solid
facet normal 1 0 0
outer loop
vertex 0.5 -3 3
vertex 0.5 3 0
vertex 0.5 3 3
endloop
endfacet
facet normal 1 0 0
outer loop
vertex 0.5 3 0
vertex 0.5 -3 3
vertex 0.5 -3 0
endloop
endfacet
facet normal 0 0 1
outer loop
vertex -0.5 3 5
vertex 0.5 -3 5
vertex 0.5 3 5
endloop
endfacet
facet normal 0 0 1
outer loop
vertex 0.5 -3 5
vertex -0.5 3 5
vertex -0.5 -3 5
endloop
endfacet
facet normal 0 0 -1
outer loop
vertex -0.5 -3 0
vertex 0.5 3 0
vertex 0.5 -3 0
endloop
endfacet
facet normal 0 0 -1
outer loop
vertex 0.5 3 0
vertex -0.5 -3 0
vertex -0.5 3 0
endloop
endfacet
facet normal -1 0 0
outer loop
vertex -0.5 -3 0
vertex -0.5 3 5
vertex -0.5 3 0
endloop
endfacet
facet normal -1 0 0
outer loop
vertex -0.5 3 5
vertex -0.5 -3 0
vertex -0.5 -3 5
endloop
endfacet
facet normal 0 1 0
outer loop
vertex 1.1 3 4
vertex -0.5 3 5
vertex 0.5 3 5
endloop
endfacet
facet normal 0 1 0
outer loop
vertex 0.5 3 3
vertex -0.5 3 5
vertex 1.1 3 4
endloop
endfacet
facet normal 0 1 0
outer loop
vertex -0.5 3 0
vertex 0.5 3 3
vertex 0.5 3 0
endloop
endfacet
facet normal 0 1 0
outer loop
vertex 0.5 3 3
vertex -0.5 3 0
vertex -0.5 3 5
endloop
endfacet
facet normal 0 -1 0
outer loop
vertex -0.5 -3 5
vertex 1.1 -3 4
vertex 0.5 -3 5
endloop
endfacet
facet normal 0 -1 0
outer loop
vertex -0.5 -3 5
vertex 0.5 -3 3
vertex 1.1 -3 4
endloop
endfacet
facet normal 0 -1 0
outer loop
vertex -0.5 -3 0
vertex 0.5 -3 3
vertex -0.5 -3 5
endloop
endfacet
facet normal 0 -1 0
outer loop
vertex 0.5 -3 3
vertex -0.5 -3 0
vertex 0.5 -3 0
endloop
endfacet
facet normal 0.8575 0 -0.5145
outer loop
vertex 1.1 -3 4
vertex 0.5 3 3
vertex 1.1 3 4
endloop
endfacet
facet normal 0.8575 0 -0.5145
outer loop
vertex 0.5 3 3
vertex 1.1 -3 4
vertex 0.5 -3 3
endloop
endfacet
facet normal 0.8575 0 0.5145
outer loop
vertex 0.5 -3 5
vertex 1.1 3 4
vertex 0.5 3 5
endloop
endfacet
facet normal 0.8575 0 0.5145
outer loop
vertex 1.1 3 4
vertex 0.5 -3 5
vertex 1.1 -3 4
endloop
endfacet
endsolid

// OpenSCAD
/* OpenSCAD Snap Joint
    Copyright (C) 2019  Benjamin Hubbard

    This program is free software: you can redistribute it and/or modify
    it under the terms of the GNU General Public License as published by
    the Free Software Foundation, either version 3 of the License, or
    (at your option) any later version.

    This program is distributed in the hope that it will be useful,
    but WITHOUT ANY WARRANTY; without even the implied warranty of
    MERCHANTABILITY or FITNESS FOR A PARTICULAR PURPOSE.  See the
    GNU General Public License for more details.

    You should have received a copy of the GNU General Public License
    along with this program.  If not, see <https://www.gnu.org/licenses/>.
 */

module snap_joint(size, isCutout)
{
    height = size * 5;
    width = size * 6;

    if (isCutout)
    {
        height = height * 1.1;
        width = width * 1.1;

        union()
        {
            translate([ -size * 0.6, 0, height / 2 ]) cube([ size * 2.5, width, height ], center = true);

            translate([ size * 0.6, 0, height - 1.25 * size ]) scale([ 1, 1, 1 ])
                cube([ size * 1, width, size * 2.5 ], center = true);
        }
    }

    if (!isCutout)
    {
        union()
        {
            translate([ 0, 0, height / 2 ]) cube([ size, width, height ], center = true);

            translate([ size / 2, 0, height - size ]) scale([ 0.6, 1, 1 ]) rotate([ 0, 45, 0 ])
                cube([ size * sqrt(2), width, size * sqrt(2) ], center = true);
        }
    }
}

// Sample render.
// Hole size, mm.
size = 1;

snap_joint(size, 0);
% snap_joint(size, 1);
